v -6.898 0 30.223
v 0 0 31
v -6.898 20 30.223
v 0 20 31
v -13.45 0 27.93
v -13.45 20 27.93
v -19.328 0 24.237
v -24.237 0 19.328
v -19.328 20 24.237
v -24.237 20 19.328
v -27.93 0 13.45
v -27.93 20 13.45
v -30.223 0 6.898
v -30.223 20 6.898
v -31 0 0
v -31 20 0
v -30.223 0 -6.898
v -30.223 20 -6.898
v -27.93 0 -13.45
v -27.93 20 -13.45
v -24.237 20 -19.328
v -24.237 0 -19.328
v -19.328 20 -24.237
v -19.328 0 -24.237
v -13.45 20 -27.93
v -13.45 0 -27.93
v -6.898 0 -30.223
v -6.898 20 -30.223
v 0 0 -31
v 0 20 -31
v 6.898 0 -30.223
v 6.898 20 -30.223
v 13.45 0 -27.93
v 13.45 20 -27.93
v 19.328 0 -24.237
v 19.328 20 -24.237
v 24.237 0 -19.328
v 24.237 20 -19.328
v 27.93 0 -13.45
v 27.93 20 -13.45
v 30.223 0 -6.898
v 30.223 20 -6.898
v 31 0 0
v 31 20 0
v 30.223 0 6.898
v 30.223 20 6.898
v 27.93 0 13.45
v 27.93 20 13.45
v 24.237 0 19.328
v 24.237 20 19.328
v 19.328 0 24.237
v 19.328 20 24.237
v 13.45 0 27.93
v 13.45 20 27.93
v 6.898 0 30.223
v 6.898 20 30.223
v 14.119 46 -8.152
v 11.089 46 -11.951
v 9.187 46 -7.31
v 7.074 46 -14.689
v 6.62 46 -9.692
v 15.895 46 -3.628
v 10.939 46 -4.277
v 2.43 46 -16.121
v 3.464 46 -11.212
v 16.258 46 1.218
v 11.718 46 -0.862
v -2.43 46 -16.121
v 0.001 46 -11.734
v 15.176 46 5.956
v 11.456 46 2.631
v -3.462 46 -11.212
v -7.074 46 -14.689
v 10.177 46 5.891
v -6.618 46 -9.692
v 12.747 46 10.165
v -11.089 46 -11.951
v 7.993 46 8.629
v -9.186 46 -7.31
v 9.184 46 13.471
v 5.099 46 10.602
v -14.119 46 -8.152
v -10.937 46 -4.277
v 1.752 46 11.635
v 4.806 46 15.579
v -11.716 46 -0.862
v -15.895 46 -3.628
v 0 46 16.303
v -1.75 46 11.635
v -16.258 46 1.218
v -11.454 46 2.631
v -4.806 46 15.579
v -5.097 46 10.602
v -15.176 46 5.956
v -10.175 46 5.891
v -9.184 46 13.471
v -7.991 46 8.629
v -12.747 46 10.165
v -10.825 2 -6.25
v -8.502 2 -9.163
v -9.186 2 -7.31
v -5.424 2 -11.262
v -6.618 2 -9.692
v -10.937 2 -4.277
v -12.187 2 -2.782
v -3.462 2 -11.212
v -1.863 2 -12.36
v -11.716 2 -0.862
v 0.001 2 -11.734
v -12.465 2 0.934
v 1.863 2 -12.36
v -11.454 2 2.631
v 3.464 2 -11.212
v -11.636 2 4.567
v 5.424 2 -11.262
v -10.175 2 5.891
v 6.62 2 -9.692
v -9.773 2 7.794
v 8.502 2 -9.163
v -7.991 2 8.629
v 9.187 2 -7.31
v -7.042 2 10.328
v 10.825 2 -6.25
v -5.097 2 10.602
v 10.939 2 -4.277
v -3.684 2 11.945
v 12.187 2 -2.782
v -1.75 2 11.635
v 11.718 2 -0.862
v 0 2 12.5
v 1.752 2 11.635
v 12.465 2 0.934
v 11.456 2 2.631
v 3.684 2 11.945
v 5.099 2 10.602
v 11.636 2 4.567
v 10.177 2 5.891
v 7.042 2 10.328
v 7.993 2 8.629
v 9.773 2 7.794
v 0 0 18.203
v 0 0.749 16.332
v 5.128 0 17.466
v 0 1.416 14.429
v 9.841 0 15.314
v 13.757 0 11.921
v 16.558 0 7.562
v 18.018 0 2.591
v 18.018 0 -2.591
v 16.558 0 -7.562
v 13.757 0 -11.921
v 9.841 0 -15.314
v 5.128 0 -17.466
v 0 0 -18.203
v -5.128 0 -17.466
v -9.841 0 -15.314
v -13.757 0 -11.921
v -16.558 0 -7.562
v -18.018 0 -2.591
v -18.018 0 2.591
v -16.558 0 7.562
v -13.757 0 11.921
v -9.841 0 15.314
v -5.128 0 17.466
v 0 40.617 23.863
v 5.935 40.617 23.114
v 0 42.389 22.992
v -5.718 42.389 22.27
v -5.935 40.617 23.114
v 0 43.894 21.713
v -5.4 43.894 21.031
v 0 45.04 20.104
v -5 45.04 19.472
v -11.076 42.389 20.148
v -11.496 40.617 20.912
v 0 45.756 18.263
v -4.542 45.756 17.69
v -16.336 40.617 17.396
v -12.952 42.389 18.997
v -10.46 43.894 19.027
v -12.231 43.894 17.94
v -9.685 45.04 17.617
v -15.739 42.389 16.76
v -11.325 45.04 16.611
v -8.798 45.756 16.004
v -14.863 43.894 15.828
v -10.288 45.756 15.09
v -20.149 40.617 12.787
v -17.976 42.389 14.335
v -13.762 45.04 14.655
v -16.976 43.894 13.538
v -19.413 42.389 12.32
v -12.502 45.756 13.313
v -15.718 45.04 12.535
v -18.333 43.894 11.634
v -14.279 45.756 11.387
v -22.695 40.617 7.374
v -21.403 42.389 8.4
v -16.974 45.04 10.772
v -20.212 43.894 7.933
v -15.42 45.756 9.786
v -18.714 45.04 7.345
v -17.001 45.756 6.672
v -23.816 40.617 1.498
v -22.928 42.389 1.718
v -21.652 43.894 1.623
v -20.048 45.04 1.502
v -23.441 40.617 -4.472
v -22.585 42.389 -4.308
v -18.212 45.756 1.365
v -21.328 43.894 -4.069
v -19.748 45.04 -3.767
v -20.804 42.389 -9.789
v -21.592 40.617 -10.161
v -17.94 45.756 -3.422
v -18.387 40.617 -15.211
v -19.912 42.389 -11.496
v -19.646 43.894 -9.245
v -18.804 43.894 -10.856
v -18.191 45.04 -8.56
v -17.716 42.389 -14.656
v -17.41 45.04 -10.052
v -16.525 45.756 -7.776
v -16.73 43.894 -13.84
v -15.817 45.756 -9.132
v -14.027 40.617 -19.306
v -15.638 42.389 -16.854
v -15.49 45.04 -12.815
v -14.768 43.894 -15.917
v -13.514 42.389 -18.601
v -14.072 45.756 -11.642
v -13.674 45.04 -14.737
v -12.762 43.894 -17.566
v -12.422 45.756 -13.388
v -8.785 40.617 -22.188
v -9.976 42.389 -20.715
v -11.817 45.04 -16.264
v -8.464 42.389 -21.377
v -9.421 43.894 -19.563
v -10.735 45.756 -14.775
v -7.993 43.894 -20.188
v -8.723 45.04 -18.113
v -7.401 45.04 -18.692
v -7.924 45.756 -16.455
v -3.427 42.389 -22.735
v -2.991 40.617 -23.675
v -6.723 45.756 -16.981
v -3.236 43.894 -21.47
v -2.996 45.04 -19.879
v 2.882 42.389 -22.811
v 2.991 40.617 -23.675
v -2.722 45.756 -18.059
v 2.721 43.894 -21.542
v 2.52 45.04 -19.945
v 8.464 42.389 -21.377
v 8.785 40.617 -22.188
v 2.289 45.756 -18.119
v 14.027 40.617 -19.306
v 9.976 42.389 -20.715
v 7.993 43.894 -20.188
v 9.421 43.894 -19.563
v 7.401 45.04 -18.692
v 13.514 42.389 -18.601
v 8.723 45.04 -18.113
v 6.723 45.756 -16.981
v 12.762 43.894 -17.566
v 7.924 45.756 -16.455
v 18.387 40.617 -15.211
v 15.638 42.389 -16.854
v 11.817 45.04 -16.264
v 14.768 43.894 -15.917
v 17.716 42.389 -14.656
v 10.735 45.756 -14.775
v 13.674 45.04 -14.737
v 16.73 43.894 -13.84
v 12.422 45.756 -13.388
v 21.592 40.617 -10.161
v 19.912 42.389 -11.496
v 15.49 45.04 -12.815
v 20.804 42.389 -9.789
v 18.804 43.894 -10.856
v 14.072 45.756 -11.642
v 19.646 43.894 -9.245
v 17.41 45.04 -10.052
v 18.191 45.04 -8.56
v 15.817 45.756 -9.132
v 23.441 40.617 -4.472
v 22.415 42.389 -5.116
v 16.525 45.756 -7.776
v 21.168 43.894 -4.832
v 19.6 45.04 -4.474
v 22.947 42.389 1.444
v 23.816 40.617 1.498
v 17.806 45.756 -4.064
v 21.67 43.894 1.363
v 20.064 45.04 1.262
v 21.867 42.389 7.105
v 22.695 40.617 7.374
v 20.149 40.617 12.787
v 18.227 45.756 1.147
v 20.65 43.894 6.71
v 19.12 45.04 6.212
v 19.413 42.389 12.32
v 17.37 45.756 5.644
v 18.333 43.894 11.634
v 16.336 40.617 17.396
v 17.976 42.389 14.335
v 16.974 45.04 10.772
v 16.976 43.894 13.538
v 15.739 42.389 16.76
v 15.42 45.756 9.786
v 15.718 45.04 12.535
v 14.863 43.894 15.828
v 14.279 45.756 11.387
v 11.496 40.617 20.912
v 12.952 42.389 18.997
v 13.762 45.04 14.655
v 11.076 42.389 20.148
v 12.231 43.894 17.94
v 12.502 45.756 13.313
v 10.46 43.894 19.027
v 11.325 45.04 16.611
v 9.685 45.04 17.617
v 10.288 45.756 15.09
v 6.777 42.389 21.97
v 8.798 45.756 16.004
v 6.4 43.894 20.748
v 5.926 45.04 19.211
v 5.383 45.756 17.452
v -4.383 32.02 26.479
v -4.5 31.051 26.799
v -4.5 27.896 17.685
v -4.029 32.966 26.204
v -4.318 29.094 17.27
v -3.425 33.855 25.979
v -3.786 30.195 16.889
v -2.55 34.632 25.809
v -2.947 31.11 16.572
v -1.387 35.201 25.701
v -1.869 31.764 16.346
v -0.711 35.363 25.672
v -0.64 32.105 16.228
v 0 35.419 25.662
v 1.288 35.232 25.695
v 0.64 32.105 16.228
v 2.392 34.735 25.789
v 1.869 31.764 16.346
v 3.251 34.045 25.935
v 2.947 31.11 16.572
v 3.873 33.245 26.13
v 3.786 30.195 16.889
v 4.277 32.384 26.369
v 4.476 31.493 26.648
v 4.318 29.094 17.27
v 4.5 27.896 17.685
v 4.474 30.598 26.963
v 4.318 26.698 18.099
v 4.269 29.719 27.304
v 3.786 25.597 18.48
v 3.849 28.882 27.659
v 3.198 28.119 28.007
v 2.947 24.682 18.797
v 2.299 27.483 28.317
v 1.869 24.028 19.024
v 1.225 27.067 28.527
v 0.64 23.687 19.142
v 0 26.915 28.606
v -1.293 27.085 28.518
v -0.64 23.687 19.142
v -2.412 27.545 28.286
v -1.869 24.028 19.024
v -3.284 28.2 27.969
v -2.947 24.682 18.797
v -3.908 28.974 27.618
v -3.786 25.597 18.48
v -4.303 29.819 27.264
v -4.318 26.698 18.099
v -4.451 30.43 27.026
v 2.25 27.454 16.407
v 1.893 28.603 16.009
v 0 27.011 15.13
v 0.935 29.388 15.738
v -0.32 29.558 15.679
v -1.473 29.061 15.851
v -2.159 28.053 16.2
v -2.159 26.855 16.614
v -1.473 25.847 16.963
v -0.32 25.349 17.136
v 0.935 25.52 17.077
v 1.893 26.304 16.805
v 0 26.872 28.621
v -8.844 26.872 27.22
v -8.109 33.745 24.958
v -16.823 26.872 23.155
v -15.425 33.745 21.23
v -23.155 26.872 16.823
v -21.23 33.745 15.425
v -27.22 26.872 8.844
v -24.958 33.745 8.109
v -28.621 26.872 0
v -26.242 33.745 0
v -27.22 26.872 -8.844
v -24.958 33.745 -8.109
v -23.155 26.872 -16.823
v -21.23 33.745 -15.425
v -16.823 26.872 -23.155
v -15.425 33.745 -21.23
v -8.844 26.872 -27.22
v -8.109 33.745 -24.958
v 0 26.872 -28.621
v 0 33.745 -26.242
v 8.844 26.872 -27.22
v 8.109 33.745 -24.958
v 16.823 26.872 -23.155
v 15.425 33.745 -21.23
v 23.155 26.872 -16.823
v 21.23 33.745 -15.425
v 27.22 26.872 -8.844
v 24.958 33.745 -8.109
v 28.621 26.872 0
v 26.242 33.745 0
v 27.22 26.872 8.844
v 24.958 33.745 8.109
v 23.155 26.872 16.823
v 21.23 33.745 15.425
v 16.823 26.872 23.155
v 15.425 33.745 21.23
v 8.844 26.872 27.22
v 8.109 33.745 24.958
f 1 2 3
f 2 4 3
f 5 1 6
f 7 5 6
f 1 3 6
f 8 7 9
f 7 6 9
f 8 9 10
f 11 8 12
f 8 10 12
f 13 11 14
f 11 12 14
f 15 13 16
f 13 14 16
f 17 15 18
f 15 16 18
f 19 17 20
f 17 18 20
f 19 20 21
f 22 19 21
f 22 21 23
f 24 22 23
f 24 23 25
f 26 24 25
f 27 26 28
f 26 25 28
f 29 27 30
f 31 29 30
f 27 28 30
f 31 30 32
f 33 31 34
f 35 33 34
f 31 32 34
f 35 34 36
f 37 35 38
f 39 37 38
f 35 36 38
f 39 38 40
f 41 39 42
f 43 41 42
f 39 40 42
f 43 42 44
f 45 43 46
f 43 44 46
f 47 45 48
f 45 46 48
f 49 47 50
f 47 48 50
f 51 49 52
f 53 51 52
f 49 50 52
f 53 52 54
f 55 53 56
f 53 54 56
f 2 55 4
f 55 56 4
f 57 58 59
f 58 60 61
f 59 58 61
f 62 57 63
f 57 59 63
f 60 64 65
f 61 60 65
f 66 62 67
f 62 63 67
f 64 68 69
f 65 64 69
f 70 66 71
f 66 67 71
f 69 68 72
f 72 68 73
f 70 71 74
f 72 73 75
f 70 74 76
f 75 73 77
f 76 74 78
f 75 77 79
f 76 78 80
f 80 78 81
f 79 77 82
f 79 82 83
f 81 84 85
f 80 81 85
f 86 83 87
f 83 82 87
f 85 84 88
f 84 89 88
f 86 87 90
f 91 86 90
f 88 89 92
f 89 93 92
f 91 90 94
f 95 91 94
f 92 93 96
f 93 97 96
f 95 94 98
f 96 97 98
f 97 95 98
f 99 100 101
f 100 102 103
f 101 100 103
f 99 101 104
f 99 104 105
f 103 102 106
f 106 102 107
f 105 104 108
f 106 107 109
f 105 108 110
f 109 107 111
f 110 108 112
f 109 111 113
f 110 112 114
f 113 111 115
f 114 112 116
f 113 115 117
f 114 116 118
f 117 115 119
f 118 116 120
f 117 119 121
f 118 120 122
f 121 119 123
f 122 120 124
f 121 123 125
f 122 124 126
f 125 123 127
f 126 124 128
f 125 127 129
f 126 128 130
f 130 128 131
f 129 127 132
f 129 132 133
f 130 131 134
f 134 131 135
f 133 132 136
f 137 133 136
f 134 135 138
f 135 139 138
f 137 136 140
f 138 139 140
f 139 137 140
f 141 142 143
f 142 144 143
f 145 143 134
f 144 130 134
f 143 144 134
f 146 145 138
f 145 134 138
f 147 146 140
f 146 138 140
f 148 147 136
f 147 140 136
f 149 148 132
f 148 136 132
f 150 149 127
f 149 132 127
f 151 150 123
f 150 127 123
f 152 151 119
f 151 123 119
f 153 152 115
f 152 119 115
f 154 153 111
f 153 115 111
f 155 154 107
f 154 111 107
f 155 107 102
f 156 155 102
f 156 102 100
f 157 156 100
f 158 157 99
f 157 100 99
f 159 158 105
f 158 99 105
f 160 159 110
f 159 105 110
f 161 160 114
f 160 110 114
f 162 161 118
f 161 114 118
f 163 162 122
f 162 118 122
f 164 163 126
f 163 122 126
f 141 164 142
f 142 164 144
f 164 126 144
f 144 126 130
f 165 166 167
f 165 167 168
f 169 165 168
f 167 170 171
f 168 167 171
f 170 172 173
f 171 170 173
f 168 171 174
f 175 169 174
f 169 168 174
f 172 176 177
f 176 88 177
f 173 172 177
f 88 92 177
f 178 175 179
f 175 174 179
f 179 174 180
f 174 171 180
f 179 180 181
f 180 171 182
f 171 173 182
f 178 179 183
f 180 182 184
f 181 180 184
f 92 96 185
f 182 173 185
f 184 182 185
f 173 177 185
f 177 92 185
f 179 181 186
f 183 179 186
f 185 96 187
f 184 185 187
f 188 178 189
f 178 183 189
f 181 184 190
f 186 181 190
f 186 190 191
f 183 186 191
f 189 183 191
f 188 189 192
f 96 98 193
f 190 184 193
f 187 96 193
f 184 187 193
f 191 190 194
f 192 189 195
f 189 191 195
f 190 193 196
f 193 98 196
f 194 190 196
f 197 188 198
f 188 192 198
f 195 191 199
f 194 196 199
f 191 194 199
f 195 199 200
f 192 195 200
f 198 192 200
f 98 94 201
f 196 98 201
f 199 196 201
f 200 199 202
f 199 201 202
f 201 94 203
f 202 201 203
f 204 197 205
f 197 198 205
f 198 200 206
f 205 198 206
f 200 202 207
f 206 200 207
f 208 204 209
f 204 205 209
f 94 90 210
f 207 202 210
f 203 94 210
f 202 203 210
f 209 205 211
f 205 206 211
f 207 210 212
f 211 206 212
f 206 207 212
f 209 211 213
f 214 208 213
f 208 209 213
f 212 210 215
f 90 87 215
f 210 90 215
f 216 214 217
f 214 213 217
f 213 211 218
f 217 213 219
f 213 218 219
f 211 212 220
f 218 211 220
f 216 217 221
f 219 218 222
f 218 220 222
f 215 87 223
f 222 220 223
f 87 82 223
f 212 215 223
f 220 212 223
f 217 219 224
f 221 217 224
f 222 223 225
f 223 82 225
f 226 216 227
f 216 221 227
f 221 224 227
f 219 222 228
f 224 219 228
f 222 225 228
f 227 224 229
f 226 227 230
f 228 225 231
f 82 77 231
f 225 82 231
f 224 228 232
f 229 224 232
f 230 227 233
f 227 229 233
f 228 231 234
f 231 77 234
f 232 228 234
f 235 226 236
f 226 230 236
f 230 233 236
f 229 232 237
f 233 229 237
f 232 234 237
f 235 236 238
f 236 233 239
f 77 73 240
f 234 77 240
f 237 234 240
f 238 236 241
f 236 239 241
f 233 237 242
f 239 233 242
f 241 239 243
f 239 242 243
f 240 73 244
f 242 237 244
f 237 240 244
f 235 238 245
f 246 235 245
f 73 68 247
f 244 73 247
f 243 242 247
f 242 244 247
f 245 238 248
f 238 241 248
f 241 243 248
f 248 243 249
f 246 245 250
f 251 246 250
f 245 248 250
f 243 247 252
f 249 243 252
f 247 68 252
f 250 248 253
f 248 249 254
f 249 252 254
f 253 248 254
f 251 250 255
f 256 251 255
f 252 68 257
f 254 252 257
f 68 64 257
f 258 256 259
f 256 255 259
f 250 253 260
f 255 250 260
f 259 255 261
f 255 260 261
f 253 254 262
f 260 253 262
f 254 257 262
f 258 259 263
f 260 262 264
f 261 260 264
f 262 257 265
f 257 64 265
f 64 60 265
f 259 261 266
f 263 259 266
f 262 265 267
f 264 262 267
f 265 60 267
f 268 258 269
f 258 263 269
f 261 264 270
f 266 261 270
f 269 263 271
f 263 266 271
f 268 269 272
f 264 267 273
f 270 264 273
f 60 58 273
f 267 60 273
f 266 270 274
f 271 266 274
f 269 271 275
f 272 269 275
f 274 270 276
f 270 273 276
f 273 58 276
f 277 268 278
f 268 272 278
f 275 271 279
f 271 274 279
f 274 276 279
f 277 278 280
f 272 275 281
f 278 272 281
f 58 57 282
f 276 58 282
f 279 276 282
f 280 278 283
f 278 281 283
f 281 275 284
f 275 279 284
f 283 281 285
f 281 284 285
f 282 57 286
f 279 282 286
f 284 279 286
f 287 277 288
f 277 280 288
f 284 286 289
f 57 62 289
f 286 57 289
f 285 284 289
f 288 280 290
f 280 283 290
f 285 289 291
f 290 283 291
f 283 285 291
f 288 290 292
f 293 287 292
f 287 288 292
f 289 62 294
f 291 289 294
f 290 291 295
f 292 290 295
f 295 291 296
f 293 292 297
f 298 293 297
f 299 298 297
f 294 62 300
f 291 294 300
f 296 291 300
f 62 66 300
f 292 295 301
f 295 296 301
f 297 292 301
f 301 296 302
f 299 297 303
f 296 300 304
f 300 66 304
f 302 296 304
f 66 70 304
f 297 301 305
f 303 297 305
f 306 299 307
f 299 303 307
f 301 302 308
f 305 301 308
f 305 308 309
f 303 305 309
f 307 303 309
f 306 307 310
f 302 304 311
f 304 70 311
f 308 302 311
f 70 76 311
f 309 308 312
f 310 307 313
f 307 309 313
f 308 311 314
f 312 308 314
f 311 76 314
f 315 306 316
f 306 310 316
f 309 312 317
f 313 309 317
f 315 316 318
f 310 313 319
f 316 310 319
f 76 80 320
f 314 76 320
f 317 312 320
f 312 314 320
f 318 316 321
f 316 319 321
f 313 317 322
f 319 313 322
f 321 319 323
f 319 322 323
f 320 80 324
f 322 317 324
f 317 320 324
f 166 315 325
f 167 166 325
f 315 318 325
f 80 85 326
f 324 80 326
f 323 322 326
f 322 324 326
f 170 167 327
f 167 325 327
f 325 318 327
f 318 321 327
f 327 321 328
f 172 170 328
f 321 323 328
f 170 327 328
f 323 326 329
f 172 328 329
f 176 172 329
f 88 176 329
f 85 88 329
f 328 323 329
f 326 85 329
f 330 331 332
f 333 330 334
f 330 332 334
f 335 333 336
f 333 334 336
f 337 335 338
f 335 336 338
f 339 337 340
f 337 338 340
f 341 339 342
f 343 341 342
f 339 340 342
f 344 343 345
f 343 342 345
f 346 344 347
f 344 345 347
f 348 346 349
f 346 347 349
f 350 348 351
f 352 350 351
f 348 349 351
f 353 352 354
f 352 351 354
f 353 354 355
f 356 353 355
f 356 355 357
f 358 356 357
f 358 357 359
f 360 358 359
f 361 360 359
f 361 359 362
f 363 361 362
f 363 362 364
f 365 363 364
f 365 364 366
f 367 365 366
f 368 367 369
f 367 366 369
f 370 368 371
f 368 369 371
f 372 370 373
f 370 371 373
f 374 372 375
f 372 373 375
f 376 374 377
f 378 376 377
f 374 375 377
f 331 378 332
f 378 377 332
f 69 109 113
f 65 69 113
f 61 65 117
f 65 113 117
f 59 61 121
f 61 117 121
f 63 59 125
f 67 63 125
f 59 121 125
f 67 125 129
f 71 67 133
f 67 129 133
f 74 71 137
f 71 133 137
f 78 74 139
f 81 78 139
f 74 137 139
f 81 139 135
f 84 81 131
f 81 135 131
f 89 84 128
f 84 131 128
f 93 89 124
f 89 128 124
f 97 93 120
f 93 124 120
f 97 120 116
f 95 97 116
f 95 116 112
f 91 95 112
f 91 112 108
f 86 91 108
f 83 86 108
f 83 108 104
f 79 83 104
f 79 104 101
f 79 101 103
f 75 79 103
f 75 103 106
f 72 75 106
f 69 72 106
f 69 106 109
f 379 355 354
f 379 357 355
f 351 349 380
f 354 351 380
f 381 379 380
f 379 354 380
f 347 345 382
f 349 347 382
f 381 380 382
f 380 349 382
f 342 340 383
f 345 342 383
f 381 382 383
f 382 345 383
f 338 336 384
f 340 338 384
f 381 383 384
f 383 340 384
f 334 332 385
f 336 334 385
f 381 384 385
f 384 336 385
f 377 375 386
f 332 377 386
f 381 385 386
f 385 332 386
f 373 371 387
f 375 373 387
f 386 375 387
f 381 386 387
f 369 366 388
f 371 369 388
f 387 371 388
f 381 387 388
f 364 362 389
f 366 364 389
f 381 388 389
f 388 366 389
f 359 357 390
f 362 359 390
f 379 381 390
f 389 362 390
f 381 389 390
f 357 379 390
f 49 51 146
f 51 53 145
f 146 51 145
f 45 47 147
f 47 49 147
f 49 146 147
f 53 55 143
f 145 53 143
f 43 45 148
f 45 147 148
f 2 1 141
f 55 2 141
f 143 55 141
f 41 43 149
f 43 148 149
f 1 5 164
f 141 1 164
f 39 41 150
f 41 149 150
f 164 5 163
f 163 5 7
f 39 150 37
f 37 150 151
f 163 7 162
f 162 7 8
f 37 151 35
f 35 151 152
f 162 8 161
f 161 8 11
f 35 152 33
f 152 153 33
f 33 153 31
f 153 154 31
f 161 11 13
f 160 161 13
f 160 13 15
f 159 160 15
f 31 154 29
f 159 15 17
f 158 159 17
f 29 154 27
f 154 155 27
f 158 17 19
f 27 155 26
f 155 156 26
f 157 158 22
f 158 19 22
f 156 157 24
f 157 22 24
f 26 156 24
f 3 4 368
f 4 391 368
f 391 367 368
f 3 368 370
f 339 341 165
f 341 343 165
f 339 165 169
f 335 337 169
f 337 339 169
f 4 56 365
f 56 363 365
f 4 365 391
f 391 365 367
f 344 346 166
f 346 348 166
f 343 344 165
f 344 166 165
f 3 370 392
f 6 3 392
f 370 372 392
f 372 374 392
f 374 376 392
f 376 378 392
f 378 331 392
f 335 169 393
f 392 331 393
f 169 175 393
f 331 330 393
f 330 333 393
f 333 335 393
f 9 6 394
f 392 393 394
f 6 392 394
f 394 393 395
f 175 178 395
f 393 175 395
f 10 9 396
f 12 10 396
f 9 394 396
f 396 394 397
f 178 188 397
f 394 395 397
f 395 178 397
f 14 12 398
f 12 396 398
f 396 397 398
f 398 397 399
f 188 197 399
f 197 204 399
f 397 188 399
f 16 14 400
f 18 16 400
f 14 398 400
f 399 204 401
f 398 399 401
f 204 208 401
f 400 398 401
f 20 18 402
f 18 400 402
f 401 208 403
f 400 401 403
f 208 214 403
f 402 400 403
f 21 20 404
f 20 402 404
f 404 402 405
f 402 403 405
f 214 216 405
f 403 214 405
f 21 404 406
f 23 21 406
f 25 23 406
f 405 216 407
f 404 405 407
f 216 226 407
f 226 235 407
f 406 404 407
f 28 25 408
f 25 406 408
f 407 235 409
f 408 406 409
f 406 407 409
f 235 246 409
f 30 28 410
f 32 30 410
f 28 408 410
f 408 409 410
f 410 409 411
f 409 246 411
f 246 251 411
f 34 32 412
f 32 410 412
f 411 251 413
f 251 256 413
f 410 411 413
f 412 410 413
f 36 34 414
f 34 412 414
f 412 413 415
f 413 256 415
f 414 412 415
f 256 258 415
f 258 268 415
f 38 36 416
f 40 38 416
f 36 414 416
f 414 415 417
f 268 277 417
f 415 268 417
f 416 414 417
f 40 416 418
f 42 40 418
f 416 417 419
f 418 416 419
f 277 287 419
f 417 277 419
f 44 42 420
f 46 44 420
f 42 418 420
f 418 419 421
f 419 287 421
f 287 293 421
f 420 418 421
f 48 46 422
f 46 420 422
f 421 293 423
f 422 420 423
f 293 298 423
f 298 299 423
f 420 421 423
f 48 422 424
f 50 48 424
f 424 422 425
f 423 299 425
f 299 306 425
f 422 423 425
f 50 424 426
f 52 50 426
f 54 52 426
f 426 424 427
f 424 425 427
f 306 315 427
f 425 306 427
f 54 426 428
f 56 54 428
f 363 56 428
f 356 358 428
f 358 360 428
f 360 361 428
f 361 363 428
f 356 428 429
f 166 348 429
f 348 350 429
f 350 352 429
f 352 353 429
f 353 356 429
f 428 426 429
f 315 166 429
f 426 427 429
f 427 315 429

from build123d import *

# Parameters (mm, degrees)
M25X1_5_DI_LI_DELIK1_D     = 23.5
RADYUS1_R                  = 8
M10X1_0_DI_LI_DELIK2_D     = 9
M10X1_0_DI_LI_DELIK2_DEPTH = 10
M10X1_0_DI_LI_DELIK2_TIP   = 2.703872786


with BuildPart() as part:
    # Çizim1 → Döndür1 (revolve)
    with BuildSketch(Plane.XY, mode=Mode.PRIVATE) as d_nd_r1_sk:
        Polygon((0, 46), (0, 0), (31, 0), (31, 20), (22, 46), align=None)
    revolve(d_nd_r1_sk.sketch.rotate(Axis((0, 46, 0), (0, -1, 0)), 90), axis=Axis((0, 46, 0), (0, -1, 0)))

    # M25x1.5 Dişli Delik1 (through all)
    with Locations(Plane(origin=(0.000913764, 46, 0.015948363), x_dir=(0, 0, 1), z_dir=(0, 1, 0))):
        with Locations((0, 0)):
            Hole(M25X1_5_DI_LI_DELIK1_D / 2)

    # Radyus1
    radyus1_edges = [part.edges().sort_by_distance(p)[0] for p in [
        (0, 46, -22),
    ]]
    fillet(radyus1_edges, radius=RADYUS1_R)

    # M10x1.0 Dişli Delik2
    with Locations(Plane(origin=(0, 11.722589168, 33.865257596), x_dir=(1, 0, 0), z_dir=(0, 0.32711056388316634, 0.9449860734402582))):
        with Locations((0, 20.576424516)):
            Hole(M10X1_0_DI_LI_DELIK2_D / 2, depth=M10X1_0_DI_LI_DELIK2_DEPTH)
            with Locations((0, 0, -(M10X1_0_DI_LI_DELIK2_DEPTH + M10X1_0_DI_LI_DELIK2_TIP / 2))):  # 118° drill point
                Cone(0, M10X1_0_DI_LI_DELIK2_D / 2, M10X1_0_DI_LI_DELIK2_TIP, mode=Mode.SUBTRACT)

    # Çizim14 → Kes-Döndür1 (revolve, cut)
    with BuildSketch(Plane(origin=(0, 0, 0), x_dir=(0, 0, -1), z_dir=(1, 0, 0))):
        with BuildLine():
            Line((0, 0), (-18.203352341, 0))
            ThreePointArc((-18.203352341, 0), (-15.384211427, 1.092780017), (-12.5, 2))
            Line((-12.5, 2), (0, 2))
            Line((0, 2), (0, 0))
        make_face()
    revolve(axis=Axis((0, 0, 0), (0, 1, 0)), mode=Mode.SUBTRACT)


solid = part.part
